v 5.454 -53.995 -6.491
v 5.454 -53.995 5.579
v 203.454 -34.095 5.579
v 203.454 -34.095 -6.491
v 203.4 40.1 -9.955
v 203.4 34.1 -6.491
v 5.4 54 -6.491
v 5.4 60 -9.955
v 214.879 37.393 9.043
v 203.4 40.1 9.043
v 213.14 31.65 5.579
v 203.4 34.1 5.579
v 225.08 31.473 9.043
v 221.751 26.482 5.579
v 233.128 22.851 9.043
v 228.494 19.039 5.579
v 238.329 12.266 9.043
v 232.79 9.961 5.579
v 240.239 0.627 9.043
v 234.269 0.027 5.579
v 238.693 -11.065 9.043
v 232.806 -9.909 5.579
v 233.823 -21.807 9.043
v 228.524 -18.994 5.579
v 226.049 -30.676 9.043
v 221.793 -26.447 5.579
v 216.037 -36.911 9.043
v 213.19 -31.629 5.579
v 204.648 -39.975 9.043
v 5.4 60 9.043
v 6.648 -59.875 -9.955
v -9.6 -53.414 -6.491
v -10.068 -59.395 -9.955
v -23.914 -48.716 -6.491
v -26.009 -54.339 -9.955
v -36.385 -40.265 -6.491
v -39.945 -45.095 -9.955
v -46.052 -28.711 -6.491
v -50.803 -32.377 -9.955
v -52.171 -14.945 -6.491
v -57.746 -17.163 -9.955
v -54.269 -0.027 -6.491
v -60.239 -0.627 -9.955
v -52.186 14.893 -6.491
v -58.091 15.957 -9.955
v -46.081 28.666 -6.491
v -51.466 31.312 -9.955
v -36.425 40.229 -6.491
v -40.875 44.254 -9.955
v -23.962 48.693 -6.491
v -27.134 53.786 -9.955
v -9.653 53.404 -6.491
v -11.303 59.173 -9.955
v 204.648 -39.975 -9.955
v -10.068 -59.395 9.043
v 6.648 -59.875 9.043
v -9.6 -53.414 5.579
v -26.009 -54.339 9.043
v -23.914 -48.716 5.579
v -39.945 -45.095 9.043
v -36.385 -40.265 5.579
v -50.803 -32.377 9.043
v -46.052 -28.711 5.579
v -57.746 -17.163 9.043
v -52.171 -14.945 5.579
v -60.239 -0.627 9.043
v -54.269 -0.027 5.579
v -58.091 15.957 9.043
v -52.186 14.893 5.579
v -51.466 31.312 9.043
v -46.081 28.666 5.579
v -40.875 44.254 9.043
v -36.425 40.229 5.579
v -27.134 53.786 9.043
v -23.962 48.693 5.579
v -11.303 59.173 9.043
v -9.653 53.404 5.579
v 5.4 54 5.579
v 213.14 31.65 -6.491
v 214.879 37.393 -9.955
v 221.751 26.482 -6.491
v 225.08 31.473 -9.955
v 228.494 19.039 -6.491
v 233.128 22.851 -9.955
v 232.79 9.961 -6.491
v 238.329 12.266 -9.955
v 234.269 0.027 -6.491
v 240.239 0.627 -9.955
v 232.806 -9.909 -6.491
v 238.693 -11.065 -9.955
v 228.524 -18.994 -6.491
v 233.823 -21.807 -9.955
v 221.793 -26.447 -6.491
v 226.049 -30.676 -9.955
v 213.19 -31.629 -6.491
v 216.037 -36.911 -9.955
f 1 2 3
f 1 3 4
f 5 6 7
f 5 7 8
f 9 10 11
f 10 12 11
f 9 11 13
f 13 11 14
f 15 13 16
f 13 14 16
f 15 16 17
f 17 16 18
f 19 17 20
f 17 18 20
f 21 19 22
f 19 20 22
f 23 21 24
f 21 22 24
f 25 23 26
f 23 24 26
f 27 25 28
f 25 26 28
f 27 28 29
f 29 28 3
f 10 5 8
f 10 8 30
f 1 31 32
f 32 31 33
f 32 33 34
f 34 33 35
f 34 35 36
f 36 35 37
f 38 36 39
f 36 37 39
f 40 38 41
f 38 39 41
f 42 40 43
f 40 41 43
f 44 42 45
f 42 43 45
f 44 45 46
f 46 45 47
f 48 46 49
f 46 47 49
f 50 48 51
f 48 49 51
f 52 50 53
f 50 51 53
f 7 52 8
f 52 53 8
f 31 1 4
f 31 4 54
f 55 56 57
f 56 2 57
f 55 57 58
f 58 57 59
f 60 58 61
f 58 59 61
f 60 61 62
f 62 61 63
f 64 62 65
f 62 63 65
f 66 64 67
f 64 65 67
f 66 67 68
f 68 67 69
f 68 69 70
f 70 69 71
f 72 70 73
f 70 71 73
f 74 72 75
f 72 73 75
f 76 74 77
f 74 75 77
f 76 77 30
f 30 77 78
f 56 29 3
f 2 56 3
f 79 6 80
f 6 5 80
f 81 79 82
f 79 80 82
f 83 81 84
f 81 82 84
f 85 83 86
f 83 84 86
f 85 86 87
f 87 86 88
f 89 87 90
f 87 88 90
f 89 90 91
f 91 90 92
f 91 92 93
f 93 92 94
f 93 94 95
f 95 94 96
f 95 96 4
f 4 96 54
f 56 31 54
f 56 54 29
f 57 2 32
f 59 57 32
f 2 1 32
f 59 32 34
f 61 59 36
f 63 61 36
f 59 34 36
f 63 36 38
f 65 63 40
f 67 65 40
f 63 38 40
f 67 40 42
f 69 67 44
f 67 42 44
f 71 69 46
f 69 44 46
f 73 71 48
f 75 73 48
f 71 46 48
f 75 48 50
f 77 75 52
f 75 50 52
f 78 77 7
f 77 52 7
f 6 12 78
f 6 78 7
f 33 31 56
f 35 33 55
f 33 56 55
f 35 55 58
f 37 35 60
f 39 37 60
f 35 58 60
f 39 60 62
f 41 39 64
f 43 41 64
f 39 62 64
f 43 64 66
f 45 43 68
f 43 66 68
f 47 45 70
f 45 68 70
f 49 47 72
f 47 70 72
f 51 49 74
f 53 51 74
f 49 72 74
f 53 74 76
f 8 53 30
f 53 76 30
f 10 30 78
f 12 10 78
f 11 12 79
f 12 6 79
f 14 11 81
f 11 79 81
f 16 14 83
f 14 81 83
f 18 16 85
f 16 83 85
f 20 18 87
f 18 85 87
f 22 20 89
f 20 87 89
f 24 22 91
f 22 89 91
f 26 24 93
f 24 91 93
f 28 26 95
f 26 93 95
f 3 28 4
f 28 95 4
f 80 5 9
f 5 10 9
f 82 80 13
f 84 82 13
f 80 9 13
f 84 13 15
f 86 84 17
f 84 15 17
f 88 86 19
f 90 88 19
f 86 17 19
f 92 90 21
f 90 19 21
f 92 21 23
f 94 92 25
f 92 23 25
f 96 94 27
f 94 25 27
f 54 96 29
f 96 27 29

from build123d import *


with BuildPart() as part:
    # Sweep1: sweep along a path in Sketch2
    with BuildLine(Plane.XY) as sweep1_path:
        Line((5.4, 53.729321604), (203.4, 33.829572862))
        ThreePointArc((203.4, 33.829572862), (234, 0), (203.4, -33.829572862))
        Line((203.4, -33.829572862), (5.4, -53.729321604))
        ThreePointArc((5.4, -53.729321604), (-54, 0), (5.4, 53.729321604))
    # Sketch3 → Sweep1 (sweep)
    with BuildSketch(Plane(origin=(5.4, 0, 0), x_dir=(0, 0, -1), z_dir=(1, 0, 0))):
        Polygon((-5.579370292, 54), (6.490629708, 54), (9.954731324, 60), (-9.043471907, 60), align=None)
    sweep(path=sweep1_path.line)


solid = part.part
